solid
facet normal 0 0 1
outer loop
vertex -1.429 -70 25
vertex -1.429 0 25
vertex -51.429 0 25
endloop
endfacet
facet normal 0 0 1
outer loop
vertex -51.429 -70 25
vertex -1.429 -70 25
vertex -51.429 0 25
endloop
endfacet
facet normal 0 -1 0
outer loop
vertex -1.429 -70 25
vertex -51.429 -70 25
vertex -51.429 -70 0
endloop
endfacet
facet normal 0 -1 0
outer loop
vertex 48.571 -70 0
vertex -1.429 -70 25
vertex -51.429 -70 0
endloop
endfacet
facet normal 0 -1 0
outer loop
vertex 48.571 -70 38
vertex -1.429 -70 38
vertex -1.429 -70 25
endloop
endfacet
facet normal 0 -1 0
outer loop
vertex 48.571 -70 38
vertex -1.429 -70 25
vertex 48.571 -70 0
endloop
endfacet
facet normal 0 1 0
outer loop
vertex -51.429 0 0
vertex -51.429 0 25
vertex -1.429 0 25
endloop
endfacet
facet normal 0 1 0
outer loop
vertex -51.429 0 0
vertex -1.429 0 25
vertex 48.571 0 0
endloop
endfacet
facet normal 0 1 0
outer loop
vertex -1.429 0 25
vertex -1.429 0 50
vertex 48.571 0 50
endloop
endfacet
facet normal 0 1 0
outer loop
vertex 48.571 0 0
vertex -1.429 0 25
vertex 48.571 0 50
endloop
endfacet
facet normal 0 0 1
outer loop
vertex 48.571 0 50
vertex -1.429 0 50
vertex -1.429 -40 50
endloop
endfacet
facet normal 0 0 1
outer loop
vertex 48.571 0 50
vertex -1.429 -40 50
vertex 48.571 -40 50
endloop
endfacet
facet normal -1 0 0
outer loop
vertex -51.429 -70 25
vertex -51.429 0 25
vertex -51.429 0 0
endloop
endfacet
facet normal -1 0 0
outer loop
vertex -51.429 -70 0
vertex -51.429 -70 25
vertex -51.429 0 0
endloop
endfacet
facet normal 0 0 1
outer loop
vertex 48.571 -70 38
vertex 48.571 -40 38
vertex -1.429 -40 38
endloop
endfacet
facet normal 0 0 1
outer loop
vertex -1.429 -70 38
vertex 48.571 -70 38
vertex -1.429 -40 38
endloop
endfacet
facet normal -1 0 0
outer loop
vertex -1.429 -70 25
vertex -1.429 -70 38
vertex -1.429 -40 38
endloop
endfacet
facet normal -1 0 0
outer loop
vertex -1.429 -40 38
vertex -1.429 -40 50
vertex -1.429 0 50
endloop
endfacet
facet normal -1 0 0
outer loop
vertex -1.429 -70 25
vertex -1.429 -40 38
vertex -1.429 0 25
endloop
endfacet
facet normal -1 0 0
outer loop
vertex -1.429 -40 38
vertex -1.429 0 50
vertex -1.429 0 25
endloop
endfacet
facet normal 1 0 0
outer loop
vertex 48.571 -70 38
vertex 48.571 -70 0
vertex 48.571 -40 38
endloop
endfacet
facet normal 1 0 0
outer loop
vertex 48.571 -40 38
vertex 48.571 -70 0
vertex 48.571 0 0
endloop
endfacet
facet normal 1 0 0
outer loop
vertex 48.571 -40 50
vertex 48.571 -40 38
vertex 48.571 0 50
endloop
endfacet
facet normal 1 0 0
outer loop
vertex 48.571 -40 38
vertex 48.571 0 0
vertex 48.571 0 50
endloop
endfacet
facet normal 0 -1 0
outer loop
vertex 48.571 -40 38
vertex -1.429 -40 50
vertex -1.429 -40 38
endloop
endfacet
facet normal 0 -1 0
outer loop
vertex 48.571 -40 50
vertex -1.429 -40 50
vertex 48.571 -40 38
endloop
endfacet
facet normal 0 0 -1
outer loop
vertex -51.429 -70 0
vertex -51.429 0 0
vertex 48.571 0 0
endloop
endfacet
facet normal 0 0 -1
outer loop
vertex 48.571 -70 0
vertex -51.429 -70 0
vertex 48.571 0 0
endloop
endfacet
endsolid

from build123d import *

# Parameters (mm, degrees)
F1_DEPTH = 70
F0_W     = 50
F0_H     = 12
F2_DEPTH = 40


with BuildPart() as f1:
    # F0 (on Front) → F1 (new body)
    with BuildSketch(Plane.XZ):
        Polygon((-51.428571, 25), (-51.428571, 0), (48.571429, 0), (48.571429, 38), (-1.428571, 38), (-1.428571, 25), align=None)
    extrude(amount=F1_DEPTH)

    # F0 (on Front) → F2 (join)
    with BuildSketch(Plane.XZ):
        Polygon((-51.428571, 25), (-51.428571, 0), (48.571429, 0), (48.571429, 38), (-1.428571, 38), (-1.428571, 25), align=None)
        with Locations((23.571429, 44)):
            Rectangle(F0_W, F0_H)
    extrude(amount=F2_DEPTH)


solid = f1.part
